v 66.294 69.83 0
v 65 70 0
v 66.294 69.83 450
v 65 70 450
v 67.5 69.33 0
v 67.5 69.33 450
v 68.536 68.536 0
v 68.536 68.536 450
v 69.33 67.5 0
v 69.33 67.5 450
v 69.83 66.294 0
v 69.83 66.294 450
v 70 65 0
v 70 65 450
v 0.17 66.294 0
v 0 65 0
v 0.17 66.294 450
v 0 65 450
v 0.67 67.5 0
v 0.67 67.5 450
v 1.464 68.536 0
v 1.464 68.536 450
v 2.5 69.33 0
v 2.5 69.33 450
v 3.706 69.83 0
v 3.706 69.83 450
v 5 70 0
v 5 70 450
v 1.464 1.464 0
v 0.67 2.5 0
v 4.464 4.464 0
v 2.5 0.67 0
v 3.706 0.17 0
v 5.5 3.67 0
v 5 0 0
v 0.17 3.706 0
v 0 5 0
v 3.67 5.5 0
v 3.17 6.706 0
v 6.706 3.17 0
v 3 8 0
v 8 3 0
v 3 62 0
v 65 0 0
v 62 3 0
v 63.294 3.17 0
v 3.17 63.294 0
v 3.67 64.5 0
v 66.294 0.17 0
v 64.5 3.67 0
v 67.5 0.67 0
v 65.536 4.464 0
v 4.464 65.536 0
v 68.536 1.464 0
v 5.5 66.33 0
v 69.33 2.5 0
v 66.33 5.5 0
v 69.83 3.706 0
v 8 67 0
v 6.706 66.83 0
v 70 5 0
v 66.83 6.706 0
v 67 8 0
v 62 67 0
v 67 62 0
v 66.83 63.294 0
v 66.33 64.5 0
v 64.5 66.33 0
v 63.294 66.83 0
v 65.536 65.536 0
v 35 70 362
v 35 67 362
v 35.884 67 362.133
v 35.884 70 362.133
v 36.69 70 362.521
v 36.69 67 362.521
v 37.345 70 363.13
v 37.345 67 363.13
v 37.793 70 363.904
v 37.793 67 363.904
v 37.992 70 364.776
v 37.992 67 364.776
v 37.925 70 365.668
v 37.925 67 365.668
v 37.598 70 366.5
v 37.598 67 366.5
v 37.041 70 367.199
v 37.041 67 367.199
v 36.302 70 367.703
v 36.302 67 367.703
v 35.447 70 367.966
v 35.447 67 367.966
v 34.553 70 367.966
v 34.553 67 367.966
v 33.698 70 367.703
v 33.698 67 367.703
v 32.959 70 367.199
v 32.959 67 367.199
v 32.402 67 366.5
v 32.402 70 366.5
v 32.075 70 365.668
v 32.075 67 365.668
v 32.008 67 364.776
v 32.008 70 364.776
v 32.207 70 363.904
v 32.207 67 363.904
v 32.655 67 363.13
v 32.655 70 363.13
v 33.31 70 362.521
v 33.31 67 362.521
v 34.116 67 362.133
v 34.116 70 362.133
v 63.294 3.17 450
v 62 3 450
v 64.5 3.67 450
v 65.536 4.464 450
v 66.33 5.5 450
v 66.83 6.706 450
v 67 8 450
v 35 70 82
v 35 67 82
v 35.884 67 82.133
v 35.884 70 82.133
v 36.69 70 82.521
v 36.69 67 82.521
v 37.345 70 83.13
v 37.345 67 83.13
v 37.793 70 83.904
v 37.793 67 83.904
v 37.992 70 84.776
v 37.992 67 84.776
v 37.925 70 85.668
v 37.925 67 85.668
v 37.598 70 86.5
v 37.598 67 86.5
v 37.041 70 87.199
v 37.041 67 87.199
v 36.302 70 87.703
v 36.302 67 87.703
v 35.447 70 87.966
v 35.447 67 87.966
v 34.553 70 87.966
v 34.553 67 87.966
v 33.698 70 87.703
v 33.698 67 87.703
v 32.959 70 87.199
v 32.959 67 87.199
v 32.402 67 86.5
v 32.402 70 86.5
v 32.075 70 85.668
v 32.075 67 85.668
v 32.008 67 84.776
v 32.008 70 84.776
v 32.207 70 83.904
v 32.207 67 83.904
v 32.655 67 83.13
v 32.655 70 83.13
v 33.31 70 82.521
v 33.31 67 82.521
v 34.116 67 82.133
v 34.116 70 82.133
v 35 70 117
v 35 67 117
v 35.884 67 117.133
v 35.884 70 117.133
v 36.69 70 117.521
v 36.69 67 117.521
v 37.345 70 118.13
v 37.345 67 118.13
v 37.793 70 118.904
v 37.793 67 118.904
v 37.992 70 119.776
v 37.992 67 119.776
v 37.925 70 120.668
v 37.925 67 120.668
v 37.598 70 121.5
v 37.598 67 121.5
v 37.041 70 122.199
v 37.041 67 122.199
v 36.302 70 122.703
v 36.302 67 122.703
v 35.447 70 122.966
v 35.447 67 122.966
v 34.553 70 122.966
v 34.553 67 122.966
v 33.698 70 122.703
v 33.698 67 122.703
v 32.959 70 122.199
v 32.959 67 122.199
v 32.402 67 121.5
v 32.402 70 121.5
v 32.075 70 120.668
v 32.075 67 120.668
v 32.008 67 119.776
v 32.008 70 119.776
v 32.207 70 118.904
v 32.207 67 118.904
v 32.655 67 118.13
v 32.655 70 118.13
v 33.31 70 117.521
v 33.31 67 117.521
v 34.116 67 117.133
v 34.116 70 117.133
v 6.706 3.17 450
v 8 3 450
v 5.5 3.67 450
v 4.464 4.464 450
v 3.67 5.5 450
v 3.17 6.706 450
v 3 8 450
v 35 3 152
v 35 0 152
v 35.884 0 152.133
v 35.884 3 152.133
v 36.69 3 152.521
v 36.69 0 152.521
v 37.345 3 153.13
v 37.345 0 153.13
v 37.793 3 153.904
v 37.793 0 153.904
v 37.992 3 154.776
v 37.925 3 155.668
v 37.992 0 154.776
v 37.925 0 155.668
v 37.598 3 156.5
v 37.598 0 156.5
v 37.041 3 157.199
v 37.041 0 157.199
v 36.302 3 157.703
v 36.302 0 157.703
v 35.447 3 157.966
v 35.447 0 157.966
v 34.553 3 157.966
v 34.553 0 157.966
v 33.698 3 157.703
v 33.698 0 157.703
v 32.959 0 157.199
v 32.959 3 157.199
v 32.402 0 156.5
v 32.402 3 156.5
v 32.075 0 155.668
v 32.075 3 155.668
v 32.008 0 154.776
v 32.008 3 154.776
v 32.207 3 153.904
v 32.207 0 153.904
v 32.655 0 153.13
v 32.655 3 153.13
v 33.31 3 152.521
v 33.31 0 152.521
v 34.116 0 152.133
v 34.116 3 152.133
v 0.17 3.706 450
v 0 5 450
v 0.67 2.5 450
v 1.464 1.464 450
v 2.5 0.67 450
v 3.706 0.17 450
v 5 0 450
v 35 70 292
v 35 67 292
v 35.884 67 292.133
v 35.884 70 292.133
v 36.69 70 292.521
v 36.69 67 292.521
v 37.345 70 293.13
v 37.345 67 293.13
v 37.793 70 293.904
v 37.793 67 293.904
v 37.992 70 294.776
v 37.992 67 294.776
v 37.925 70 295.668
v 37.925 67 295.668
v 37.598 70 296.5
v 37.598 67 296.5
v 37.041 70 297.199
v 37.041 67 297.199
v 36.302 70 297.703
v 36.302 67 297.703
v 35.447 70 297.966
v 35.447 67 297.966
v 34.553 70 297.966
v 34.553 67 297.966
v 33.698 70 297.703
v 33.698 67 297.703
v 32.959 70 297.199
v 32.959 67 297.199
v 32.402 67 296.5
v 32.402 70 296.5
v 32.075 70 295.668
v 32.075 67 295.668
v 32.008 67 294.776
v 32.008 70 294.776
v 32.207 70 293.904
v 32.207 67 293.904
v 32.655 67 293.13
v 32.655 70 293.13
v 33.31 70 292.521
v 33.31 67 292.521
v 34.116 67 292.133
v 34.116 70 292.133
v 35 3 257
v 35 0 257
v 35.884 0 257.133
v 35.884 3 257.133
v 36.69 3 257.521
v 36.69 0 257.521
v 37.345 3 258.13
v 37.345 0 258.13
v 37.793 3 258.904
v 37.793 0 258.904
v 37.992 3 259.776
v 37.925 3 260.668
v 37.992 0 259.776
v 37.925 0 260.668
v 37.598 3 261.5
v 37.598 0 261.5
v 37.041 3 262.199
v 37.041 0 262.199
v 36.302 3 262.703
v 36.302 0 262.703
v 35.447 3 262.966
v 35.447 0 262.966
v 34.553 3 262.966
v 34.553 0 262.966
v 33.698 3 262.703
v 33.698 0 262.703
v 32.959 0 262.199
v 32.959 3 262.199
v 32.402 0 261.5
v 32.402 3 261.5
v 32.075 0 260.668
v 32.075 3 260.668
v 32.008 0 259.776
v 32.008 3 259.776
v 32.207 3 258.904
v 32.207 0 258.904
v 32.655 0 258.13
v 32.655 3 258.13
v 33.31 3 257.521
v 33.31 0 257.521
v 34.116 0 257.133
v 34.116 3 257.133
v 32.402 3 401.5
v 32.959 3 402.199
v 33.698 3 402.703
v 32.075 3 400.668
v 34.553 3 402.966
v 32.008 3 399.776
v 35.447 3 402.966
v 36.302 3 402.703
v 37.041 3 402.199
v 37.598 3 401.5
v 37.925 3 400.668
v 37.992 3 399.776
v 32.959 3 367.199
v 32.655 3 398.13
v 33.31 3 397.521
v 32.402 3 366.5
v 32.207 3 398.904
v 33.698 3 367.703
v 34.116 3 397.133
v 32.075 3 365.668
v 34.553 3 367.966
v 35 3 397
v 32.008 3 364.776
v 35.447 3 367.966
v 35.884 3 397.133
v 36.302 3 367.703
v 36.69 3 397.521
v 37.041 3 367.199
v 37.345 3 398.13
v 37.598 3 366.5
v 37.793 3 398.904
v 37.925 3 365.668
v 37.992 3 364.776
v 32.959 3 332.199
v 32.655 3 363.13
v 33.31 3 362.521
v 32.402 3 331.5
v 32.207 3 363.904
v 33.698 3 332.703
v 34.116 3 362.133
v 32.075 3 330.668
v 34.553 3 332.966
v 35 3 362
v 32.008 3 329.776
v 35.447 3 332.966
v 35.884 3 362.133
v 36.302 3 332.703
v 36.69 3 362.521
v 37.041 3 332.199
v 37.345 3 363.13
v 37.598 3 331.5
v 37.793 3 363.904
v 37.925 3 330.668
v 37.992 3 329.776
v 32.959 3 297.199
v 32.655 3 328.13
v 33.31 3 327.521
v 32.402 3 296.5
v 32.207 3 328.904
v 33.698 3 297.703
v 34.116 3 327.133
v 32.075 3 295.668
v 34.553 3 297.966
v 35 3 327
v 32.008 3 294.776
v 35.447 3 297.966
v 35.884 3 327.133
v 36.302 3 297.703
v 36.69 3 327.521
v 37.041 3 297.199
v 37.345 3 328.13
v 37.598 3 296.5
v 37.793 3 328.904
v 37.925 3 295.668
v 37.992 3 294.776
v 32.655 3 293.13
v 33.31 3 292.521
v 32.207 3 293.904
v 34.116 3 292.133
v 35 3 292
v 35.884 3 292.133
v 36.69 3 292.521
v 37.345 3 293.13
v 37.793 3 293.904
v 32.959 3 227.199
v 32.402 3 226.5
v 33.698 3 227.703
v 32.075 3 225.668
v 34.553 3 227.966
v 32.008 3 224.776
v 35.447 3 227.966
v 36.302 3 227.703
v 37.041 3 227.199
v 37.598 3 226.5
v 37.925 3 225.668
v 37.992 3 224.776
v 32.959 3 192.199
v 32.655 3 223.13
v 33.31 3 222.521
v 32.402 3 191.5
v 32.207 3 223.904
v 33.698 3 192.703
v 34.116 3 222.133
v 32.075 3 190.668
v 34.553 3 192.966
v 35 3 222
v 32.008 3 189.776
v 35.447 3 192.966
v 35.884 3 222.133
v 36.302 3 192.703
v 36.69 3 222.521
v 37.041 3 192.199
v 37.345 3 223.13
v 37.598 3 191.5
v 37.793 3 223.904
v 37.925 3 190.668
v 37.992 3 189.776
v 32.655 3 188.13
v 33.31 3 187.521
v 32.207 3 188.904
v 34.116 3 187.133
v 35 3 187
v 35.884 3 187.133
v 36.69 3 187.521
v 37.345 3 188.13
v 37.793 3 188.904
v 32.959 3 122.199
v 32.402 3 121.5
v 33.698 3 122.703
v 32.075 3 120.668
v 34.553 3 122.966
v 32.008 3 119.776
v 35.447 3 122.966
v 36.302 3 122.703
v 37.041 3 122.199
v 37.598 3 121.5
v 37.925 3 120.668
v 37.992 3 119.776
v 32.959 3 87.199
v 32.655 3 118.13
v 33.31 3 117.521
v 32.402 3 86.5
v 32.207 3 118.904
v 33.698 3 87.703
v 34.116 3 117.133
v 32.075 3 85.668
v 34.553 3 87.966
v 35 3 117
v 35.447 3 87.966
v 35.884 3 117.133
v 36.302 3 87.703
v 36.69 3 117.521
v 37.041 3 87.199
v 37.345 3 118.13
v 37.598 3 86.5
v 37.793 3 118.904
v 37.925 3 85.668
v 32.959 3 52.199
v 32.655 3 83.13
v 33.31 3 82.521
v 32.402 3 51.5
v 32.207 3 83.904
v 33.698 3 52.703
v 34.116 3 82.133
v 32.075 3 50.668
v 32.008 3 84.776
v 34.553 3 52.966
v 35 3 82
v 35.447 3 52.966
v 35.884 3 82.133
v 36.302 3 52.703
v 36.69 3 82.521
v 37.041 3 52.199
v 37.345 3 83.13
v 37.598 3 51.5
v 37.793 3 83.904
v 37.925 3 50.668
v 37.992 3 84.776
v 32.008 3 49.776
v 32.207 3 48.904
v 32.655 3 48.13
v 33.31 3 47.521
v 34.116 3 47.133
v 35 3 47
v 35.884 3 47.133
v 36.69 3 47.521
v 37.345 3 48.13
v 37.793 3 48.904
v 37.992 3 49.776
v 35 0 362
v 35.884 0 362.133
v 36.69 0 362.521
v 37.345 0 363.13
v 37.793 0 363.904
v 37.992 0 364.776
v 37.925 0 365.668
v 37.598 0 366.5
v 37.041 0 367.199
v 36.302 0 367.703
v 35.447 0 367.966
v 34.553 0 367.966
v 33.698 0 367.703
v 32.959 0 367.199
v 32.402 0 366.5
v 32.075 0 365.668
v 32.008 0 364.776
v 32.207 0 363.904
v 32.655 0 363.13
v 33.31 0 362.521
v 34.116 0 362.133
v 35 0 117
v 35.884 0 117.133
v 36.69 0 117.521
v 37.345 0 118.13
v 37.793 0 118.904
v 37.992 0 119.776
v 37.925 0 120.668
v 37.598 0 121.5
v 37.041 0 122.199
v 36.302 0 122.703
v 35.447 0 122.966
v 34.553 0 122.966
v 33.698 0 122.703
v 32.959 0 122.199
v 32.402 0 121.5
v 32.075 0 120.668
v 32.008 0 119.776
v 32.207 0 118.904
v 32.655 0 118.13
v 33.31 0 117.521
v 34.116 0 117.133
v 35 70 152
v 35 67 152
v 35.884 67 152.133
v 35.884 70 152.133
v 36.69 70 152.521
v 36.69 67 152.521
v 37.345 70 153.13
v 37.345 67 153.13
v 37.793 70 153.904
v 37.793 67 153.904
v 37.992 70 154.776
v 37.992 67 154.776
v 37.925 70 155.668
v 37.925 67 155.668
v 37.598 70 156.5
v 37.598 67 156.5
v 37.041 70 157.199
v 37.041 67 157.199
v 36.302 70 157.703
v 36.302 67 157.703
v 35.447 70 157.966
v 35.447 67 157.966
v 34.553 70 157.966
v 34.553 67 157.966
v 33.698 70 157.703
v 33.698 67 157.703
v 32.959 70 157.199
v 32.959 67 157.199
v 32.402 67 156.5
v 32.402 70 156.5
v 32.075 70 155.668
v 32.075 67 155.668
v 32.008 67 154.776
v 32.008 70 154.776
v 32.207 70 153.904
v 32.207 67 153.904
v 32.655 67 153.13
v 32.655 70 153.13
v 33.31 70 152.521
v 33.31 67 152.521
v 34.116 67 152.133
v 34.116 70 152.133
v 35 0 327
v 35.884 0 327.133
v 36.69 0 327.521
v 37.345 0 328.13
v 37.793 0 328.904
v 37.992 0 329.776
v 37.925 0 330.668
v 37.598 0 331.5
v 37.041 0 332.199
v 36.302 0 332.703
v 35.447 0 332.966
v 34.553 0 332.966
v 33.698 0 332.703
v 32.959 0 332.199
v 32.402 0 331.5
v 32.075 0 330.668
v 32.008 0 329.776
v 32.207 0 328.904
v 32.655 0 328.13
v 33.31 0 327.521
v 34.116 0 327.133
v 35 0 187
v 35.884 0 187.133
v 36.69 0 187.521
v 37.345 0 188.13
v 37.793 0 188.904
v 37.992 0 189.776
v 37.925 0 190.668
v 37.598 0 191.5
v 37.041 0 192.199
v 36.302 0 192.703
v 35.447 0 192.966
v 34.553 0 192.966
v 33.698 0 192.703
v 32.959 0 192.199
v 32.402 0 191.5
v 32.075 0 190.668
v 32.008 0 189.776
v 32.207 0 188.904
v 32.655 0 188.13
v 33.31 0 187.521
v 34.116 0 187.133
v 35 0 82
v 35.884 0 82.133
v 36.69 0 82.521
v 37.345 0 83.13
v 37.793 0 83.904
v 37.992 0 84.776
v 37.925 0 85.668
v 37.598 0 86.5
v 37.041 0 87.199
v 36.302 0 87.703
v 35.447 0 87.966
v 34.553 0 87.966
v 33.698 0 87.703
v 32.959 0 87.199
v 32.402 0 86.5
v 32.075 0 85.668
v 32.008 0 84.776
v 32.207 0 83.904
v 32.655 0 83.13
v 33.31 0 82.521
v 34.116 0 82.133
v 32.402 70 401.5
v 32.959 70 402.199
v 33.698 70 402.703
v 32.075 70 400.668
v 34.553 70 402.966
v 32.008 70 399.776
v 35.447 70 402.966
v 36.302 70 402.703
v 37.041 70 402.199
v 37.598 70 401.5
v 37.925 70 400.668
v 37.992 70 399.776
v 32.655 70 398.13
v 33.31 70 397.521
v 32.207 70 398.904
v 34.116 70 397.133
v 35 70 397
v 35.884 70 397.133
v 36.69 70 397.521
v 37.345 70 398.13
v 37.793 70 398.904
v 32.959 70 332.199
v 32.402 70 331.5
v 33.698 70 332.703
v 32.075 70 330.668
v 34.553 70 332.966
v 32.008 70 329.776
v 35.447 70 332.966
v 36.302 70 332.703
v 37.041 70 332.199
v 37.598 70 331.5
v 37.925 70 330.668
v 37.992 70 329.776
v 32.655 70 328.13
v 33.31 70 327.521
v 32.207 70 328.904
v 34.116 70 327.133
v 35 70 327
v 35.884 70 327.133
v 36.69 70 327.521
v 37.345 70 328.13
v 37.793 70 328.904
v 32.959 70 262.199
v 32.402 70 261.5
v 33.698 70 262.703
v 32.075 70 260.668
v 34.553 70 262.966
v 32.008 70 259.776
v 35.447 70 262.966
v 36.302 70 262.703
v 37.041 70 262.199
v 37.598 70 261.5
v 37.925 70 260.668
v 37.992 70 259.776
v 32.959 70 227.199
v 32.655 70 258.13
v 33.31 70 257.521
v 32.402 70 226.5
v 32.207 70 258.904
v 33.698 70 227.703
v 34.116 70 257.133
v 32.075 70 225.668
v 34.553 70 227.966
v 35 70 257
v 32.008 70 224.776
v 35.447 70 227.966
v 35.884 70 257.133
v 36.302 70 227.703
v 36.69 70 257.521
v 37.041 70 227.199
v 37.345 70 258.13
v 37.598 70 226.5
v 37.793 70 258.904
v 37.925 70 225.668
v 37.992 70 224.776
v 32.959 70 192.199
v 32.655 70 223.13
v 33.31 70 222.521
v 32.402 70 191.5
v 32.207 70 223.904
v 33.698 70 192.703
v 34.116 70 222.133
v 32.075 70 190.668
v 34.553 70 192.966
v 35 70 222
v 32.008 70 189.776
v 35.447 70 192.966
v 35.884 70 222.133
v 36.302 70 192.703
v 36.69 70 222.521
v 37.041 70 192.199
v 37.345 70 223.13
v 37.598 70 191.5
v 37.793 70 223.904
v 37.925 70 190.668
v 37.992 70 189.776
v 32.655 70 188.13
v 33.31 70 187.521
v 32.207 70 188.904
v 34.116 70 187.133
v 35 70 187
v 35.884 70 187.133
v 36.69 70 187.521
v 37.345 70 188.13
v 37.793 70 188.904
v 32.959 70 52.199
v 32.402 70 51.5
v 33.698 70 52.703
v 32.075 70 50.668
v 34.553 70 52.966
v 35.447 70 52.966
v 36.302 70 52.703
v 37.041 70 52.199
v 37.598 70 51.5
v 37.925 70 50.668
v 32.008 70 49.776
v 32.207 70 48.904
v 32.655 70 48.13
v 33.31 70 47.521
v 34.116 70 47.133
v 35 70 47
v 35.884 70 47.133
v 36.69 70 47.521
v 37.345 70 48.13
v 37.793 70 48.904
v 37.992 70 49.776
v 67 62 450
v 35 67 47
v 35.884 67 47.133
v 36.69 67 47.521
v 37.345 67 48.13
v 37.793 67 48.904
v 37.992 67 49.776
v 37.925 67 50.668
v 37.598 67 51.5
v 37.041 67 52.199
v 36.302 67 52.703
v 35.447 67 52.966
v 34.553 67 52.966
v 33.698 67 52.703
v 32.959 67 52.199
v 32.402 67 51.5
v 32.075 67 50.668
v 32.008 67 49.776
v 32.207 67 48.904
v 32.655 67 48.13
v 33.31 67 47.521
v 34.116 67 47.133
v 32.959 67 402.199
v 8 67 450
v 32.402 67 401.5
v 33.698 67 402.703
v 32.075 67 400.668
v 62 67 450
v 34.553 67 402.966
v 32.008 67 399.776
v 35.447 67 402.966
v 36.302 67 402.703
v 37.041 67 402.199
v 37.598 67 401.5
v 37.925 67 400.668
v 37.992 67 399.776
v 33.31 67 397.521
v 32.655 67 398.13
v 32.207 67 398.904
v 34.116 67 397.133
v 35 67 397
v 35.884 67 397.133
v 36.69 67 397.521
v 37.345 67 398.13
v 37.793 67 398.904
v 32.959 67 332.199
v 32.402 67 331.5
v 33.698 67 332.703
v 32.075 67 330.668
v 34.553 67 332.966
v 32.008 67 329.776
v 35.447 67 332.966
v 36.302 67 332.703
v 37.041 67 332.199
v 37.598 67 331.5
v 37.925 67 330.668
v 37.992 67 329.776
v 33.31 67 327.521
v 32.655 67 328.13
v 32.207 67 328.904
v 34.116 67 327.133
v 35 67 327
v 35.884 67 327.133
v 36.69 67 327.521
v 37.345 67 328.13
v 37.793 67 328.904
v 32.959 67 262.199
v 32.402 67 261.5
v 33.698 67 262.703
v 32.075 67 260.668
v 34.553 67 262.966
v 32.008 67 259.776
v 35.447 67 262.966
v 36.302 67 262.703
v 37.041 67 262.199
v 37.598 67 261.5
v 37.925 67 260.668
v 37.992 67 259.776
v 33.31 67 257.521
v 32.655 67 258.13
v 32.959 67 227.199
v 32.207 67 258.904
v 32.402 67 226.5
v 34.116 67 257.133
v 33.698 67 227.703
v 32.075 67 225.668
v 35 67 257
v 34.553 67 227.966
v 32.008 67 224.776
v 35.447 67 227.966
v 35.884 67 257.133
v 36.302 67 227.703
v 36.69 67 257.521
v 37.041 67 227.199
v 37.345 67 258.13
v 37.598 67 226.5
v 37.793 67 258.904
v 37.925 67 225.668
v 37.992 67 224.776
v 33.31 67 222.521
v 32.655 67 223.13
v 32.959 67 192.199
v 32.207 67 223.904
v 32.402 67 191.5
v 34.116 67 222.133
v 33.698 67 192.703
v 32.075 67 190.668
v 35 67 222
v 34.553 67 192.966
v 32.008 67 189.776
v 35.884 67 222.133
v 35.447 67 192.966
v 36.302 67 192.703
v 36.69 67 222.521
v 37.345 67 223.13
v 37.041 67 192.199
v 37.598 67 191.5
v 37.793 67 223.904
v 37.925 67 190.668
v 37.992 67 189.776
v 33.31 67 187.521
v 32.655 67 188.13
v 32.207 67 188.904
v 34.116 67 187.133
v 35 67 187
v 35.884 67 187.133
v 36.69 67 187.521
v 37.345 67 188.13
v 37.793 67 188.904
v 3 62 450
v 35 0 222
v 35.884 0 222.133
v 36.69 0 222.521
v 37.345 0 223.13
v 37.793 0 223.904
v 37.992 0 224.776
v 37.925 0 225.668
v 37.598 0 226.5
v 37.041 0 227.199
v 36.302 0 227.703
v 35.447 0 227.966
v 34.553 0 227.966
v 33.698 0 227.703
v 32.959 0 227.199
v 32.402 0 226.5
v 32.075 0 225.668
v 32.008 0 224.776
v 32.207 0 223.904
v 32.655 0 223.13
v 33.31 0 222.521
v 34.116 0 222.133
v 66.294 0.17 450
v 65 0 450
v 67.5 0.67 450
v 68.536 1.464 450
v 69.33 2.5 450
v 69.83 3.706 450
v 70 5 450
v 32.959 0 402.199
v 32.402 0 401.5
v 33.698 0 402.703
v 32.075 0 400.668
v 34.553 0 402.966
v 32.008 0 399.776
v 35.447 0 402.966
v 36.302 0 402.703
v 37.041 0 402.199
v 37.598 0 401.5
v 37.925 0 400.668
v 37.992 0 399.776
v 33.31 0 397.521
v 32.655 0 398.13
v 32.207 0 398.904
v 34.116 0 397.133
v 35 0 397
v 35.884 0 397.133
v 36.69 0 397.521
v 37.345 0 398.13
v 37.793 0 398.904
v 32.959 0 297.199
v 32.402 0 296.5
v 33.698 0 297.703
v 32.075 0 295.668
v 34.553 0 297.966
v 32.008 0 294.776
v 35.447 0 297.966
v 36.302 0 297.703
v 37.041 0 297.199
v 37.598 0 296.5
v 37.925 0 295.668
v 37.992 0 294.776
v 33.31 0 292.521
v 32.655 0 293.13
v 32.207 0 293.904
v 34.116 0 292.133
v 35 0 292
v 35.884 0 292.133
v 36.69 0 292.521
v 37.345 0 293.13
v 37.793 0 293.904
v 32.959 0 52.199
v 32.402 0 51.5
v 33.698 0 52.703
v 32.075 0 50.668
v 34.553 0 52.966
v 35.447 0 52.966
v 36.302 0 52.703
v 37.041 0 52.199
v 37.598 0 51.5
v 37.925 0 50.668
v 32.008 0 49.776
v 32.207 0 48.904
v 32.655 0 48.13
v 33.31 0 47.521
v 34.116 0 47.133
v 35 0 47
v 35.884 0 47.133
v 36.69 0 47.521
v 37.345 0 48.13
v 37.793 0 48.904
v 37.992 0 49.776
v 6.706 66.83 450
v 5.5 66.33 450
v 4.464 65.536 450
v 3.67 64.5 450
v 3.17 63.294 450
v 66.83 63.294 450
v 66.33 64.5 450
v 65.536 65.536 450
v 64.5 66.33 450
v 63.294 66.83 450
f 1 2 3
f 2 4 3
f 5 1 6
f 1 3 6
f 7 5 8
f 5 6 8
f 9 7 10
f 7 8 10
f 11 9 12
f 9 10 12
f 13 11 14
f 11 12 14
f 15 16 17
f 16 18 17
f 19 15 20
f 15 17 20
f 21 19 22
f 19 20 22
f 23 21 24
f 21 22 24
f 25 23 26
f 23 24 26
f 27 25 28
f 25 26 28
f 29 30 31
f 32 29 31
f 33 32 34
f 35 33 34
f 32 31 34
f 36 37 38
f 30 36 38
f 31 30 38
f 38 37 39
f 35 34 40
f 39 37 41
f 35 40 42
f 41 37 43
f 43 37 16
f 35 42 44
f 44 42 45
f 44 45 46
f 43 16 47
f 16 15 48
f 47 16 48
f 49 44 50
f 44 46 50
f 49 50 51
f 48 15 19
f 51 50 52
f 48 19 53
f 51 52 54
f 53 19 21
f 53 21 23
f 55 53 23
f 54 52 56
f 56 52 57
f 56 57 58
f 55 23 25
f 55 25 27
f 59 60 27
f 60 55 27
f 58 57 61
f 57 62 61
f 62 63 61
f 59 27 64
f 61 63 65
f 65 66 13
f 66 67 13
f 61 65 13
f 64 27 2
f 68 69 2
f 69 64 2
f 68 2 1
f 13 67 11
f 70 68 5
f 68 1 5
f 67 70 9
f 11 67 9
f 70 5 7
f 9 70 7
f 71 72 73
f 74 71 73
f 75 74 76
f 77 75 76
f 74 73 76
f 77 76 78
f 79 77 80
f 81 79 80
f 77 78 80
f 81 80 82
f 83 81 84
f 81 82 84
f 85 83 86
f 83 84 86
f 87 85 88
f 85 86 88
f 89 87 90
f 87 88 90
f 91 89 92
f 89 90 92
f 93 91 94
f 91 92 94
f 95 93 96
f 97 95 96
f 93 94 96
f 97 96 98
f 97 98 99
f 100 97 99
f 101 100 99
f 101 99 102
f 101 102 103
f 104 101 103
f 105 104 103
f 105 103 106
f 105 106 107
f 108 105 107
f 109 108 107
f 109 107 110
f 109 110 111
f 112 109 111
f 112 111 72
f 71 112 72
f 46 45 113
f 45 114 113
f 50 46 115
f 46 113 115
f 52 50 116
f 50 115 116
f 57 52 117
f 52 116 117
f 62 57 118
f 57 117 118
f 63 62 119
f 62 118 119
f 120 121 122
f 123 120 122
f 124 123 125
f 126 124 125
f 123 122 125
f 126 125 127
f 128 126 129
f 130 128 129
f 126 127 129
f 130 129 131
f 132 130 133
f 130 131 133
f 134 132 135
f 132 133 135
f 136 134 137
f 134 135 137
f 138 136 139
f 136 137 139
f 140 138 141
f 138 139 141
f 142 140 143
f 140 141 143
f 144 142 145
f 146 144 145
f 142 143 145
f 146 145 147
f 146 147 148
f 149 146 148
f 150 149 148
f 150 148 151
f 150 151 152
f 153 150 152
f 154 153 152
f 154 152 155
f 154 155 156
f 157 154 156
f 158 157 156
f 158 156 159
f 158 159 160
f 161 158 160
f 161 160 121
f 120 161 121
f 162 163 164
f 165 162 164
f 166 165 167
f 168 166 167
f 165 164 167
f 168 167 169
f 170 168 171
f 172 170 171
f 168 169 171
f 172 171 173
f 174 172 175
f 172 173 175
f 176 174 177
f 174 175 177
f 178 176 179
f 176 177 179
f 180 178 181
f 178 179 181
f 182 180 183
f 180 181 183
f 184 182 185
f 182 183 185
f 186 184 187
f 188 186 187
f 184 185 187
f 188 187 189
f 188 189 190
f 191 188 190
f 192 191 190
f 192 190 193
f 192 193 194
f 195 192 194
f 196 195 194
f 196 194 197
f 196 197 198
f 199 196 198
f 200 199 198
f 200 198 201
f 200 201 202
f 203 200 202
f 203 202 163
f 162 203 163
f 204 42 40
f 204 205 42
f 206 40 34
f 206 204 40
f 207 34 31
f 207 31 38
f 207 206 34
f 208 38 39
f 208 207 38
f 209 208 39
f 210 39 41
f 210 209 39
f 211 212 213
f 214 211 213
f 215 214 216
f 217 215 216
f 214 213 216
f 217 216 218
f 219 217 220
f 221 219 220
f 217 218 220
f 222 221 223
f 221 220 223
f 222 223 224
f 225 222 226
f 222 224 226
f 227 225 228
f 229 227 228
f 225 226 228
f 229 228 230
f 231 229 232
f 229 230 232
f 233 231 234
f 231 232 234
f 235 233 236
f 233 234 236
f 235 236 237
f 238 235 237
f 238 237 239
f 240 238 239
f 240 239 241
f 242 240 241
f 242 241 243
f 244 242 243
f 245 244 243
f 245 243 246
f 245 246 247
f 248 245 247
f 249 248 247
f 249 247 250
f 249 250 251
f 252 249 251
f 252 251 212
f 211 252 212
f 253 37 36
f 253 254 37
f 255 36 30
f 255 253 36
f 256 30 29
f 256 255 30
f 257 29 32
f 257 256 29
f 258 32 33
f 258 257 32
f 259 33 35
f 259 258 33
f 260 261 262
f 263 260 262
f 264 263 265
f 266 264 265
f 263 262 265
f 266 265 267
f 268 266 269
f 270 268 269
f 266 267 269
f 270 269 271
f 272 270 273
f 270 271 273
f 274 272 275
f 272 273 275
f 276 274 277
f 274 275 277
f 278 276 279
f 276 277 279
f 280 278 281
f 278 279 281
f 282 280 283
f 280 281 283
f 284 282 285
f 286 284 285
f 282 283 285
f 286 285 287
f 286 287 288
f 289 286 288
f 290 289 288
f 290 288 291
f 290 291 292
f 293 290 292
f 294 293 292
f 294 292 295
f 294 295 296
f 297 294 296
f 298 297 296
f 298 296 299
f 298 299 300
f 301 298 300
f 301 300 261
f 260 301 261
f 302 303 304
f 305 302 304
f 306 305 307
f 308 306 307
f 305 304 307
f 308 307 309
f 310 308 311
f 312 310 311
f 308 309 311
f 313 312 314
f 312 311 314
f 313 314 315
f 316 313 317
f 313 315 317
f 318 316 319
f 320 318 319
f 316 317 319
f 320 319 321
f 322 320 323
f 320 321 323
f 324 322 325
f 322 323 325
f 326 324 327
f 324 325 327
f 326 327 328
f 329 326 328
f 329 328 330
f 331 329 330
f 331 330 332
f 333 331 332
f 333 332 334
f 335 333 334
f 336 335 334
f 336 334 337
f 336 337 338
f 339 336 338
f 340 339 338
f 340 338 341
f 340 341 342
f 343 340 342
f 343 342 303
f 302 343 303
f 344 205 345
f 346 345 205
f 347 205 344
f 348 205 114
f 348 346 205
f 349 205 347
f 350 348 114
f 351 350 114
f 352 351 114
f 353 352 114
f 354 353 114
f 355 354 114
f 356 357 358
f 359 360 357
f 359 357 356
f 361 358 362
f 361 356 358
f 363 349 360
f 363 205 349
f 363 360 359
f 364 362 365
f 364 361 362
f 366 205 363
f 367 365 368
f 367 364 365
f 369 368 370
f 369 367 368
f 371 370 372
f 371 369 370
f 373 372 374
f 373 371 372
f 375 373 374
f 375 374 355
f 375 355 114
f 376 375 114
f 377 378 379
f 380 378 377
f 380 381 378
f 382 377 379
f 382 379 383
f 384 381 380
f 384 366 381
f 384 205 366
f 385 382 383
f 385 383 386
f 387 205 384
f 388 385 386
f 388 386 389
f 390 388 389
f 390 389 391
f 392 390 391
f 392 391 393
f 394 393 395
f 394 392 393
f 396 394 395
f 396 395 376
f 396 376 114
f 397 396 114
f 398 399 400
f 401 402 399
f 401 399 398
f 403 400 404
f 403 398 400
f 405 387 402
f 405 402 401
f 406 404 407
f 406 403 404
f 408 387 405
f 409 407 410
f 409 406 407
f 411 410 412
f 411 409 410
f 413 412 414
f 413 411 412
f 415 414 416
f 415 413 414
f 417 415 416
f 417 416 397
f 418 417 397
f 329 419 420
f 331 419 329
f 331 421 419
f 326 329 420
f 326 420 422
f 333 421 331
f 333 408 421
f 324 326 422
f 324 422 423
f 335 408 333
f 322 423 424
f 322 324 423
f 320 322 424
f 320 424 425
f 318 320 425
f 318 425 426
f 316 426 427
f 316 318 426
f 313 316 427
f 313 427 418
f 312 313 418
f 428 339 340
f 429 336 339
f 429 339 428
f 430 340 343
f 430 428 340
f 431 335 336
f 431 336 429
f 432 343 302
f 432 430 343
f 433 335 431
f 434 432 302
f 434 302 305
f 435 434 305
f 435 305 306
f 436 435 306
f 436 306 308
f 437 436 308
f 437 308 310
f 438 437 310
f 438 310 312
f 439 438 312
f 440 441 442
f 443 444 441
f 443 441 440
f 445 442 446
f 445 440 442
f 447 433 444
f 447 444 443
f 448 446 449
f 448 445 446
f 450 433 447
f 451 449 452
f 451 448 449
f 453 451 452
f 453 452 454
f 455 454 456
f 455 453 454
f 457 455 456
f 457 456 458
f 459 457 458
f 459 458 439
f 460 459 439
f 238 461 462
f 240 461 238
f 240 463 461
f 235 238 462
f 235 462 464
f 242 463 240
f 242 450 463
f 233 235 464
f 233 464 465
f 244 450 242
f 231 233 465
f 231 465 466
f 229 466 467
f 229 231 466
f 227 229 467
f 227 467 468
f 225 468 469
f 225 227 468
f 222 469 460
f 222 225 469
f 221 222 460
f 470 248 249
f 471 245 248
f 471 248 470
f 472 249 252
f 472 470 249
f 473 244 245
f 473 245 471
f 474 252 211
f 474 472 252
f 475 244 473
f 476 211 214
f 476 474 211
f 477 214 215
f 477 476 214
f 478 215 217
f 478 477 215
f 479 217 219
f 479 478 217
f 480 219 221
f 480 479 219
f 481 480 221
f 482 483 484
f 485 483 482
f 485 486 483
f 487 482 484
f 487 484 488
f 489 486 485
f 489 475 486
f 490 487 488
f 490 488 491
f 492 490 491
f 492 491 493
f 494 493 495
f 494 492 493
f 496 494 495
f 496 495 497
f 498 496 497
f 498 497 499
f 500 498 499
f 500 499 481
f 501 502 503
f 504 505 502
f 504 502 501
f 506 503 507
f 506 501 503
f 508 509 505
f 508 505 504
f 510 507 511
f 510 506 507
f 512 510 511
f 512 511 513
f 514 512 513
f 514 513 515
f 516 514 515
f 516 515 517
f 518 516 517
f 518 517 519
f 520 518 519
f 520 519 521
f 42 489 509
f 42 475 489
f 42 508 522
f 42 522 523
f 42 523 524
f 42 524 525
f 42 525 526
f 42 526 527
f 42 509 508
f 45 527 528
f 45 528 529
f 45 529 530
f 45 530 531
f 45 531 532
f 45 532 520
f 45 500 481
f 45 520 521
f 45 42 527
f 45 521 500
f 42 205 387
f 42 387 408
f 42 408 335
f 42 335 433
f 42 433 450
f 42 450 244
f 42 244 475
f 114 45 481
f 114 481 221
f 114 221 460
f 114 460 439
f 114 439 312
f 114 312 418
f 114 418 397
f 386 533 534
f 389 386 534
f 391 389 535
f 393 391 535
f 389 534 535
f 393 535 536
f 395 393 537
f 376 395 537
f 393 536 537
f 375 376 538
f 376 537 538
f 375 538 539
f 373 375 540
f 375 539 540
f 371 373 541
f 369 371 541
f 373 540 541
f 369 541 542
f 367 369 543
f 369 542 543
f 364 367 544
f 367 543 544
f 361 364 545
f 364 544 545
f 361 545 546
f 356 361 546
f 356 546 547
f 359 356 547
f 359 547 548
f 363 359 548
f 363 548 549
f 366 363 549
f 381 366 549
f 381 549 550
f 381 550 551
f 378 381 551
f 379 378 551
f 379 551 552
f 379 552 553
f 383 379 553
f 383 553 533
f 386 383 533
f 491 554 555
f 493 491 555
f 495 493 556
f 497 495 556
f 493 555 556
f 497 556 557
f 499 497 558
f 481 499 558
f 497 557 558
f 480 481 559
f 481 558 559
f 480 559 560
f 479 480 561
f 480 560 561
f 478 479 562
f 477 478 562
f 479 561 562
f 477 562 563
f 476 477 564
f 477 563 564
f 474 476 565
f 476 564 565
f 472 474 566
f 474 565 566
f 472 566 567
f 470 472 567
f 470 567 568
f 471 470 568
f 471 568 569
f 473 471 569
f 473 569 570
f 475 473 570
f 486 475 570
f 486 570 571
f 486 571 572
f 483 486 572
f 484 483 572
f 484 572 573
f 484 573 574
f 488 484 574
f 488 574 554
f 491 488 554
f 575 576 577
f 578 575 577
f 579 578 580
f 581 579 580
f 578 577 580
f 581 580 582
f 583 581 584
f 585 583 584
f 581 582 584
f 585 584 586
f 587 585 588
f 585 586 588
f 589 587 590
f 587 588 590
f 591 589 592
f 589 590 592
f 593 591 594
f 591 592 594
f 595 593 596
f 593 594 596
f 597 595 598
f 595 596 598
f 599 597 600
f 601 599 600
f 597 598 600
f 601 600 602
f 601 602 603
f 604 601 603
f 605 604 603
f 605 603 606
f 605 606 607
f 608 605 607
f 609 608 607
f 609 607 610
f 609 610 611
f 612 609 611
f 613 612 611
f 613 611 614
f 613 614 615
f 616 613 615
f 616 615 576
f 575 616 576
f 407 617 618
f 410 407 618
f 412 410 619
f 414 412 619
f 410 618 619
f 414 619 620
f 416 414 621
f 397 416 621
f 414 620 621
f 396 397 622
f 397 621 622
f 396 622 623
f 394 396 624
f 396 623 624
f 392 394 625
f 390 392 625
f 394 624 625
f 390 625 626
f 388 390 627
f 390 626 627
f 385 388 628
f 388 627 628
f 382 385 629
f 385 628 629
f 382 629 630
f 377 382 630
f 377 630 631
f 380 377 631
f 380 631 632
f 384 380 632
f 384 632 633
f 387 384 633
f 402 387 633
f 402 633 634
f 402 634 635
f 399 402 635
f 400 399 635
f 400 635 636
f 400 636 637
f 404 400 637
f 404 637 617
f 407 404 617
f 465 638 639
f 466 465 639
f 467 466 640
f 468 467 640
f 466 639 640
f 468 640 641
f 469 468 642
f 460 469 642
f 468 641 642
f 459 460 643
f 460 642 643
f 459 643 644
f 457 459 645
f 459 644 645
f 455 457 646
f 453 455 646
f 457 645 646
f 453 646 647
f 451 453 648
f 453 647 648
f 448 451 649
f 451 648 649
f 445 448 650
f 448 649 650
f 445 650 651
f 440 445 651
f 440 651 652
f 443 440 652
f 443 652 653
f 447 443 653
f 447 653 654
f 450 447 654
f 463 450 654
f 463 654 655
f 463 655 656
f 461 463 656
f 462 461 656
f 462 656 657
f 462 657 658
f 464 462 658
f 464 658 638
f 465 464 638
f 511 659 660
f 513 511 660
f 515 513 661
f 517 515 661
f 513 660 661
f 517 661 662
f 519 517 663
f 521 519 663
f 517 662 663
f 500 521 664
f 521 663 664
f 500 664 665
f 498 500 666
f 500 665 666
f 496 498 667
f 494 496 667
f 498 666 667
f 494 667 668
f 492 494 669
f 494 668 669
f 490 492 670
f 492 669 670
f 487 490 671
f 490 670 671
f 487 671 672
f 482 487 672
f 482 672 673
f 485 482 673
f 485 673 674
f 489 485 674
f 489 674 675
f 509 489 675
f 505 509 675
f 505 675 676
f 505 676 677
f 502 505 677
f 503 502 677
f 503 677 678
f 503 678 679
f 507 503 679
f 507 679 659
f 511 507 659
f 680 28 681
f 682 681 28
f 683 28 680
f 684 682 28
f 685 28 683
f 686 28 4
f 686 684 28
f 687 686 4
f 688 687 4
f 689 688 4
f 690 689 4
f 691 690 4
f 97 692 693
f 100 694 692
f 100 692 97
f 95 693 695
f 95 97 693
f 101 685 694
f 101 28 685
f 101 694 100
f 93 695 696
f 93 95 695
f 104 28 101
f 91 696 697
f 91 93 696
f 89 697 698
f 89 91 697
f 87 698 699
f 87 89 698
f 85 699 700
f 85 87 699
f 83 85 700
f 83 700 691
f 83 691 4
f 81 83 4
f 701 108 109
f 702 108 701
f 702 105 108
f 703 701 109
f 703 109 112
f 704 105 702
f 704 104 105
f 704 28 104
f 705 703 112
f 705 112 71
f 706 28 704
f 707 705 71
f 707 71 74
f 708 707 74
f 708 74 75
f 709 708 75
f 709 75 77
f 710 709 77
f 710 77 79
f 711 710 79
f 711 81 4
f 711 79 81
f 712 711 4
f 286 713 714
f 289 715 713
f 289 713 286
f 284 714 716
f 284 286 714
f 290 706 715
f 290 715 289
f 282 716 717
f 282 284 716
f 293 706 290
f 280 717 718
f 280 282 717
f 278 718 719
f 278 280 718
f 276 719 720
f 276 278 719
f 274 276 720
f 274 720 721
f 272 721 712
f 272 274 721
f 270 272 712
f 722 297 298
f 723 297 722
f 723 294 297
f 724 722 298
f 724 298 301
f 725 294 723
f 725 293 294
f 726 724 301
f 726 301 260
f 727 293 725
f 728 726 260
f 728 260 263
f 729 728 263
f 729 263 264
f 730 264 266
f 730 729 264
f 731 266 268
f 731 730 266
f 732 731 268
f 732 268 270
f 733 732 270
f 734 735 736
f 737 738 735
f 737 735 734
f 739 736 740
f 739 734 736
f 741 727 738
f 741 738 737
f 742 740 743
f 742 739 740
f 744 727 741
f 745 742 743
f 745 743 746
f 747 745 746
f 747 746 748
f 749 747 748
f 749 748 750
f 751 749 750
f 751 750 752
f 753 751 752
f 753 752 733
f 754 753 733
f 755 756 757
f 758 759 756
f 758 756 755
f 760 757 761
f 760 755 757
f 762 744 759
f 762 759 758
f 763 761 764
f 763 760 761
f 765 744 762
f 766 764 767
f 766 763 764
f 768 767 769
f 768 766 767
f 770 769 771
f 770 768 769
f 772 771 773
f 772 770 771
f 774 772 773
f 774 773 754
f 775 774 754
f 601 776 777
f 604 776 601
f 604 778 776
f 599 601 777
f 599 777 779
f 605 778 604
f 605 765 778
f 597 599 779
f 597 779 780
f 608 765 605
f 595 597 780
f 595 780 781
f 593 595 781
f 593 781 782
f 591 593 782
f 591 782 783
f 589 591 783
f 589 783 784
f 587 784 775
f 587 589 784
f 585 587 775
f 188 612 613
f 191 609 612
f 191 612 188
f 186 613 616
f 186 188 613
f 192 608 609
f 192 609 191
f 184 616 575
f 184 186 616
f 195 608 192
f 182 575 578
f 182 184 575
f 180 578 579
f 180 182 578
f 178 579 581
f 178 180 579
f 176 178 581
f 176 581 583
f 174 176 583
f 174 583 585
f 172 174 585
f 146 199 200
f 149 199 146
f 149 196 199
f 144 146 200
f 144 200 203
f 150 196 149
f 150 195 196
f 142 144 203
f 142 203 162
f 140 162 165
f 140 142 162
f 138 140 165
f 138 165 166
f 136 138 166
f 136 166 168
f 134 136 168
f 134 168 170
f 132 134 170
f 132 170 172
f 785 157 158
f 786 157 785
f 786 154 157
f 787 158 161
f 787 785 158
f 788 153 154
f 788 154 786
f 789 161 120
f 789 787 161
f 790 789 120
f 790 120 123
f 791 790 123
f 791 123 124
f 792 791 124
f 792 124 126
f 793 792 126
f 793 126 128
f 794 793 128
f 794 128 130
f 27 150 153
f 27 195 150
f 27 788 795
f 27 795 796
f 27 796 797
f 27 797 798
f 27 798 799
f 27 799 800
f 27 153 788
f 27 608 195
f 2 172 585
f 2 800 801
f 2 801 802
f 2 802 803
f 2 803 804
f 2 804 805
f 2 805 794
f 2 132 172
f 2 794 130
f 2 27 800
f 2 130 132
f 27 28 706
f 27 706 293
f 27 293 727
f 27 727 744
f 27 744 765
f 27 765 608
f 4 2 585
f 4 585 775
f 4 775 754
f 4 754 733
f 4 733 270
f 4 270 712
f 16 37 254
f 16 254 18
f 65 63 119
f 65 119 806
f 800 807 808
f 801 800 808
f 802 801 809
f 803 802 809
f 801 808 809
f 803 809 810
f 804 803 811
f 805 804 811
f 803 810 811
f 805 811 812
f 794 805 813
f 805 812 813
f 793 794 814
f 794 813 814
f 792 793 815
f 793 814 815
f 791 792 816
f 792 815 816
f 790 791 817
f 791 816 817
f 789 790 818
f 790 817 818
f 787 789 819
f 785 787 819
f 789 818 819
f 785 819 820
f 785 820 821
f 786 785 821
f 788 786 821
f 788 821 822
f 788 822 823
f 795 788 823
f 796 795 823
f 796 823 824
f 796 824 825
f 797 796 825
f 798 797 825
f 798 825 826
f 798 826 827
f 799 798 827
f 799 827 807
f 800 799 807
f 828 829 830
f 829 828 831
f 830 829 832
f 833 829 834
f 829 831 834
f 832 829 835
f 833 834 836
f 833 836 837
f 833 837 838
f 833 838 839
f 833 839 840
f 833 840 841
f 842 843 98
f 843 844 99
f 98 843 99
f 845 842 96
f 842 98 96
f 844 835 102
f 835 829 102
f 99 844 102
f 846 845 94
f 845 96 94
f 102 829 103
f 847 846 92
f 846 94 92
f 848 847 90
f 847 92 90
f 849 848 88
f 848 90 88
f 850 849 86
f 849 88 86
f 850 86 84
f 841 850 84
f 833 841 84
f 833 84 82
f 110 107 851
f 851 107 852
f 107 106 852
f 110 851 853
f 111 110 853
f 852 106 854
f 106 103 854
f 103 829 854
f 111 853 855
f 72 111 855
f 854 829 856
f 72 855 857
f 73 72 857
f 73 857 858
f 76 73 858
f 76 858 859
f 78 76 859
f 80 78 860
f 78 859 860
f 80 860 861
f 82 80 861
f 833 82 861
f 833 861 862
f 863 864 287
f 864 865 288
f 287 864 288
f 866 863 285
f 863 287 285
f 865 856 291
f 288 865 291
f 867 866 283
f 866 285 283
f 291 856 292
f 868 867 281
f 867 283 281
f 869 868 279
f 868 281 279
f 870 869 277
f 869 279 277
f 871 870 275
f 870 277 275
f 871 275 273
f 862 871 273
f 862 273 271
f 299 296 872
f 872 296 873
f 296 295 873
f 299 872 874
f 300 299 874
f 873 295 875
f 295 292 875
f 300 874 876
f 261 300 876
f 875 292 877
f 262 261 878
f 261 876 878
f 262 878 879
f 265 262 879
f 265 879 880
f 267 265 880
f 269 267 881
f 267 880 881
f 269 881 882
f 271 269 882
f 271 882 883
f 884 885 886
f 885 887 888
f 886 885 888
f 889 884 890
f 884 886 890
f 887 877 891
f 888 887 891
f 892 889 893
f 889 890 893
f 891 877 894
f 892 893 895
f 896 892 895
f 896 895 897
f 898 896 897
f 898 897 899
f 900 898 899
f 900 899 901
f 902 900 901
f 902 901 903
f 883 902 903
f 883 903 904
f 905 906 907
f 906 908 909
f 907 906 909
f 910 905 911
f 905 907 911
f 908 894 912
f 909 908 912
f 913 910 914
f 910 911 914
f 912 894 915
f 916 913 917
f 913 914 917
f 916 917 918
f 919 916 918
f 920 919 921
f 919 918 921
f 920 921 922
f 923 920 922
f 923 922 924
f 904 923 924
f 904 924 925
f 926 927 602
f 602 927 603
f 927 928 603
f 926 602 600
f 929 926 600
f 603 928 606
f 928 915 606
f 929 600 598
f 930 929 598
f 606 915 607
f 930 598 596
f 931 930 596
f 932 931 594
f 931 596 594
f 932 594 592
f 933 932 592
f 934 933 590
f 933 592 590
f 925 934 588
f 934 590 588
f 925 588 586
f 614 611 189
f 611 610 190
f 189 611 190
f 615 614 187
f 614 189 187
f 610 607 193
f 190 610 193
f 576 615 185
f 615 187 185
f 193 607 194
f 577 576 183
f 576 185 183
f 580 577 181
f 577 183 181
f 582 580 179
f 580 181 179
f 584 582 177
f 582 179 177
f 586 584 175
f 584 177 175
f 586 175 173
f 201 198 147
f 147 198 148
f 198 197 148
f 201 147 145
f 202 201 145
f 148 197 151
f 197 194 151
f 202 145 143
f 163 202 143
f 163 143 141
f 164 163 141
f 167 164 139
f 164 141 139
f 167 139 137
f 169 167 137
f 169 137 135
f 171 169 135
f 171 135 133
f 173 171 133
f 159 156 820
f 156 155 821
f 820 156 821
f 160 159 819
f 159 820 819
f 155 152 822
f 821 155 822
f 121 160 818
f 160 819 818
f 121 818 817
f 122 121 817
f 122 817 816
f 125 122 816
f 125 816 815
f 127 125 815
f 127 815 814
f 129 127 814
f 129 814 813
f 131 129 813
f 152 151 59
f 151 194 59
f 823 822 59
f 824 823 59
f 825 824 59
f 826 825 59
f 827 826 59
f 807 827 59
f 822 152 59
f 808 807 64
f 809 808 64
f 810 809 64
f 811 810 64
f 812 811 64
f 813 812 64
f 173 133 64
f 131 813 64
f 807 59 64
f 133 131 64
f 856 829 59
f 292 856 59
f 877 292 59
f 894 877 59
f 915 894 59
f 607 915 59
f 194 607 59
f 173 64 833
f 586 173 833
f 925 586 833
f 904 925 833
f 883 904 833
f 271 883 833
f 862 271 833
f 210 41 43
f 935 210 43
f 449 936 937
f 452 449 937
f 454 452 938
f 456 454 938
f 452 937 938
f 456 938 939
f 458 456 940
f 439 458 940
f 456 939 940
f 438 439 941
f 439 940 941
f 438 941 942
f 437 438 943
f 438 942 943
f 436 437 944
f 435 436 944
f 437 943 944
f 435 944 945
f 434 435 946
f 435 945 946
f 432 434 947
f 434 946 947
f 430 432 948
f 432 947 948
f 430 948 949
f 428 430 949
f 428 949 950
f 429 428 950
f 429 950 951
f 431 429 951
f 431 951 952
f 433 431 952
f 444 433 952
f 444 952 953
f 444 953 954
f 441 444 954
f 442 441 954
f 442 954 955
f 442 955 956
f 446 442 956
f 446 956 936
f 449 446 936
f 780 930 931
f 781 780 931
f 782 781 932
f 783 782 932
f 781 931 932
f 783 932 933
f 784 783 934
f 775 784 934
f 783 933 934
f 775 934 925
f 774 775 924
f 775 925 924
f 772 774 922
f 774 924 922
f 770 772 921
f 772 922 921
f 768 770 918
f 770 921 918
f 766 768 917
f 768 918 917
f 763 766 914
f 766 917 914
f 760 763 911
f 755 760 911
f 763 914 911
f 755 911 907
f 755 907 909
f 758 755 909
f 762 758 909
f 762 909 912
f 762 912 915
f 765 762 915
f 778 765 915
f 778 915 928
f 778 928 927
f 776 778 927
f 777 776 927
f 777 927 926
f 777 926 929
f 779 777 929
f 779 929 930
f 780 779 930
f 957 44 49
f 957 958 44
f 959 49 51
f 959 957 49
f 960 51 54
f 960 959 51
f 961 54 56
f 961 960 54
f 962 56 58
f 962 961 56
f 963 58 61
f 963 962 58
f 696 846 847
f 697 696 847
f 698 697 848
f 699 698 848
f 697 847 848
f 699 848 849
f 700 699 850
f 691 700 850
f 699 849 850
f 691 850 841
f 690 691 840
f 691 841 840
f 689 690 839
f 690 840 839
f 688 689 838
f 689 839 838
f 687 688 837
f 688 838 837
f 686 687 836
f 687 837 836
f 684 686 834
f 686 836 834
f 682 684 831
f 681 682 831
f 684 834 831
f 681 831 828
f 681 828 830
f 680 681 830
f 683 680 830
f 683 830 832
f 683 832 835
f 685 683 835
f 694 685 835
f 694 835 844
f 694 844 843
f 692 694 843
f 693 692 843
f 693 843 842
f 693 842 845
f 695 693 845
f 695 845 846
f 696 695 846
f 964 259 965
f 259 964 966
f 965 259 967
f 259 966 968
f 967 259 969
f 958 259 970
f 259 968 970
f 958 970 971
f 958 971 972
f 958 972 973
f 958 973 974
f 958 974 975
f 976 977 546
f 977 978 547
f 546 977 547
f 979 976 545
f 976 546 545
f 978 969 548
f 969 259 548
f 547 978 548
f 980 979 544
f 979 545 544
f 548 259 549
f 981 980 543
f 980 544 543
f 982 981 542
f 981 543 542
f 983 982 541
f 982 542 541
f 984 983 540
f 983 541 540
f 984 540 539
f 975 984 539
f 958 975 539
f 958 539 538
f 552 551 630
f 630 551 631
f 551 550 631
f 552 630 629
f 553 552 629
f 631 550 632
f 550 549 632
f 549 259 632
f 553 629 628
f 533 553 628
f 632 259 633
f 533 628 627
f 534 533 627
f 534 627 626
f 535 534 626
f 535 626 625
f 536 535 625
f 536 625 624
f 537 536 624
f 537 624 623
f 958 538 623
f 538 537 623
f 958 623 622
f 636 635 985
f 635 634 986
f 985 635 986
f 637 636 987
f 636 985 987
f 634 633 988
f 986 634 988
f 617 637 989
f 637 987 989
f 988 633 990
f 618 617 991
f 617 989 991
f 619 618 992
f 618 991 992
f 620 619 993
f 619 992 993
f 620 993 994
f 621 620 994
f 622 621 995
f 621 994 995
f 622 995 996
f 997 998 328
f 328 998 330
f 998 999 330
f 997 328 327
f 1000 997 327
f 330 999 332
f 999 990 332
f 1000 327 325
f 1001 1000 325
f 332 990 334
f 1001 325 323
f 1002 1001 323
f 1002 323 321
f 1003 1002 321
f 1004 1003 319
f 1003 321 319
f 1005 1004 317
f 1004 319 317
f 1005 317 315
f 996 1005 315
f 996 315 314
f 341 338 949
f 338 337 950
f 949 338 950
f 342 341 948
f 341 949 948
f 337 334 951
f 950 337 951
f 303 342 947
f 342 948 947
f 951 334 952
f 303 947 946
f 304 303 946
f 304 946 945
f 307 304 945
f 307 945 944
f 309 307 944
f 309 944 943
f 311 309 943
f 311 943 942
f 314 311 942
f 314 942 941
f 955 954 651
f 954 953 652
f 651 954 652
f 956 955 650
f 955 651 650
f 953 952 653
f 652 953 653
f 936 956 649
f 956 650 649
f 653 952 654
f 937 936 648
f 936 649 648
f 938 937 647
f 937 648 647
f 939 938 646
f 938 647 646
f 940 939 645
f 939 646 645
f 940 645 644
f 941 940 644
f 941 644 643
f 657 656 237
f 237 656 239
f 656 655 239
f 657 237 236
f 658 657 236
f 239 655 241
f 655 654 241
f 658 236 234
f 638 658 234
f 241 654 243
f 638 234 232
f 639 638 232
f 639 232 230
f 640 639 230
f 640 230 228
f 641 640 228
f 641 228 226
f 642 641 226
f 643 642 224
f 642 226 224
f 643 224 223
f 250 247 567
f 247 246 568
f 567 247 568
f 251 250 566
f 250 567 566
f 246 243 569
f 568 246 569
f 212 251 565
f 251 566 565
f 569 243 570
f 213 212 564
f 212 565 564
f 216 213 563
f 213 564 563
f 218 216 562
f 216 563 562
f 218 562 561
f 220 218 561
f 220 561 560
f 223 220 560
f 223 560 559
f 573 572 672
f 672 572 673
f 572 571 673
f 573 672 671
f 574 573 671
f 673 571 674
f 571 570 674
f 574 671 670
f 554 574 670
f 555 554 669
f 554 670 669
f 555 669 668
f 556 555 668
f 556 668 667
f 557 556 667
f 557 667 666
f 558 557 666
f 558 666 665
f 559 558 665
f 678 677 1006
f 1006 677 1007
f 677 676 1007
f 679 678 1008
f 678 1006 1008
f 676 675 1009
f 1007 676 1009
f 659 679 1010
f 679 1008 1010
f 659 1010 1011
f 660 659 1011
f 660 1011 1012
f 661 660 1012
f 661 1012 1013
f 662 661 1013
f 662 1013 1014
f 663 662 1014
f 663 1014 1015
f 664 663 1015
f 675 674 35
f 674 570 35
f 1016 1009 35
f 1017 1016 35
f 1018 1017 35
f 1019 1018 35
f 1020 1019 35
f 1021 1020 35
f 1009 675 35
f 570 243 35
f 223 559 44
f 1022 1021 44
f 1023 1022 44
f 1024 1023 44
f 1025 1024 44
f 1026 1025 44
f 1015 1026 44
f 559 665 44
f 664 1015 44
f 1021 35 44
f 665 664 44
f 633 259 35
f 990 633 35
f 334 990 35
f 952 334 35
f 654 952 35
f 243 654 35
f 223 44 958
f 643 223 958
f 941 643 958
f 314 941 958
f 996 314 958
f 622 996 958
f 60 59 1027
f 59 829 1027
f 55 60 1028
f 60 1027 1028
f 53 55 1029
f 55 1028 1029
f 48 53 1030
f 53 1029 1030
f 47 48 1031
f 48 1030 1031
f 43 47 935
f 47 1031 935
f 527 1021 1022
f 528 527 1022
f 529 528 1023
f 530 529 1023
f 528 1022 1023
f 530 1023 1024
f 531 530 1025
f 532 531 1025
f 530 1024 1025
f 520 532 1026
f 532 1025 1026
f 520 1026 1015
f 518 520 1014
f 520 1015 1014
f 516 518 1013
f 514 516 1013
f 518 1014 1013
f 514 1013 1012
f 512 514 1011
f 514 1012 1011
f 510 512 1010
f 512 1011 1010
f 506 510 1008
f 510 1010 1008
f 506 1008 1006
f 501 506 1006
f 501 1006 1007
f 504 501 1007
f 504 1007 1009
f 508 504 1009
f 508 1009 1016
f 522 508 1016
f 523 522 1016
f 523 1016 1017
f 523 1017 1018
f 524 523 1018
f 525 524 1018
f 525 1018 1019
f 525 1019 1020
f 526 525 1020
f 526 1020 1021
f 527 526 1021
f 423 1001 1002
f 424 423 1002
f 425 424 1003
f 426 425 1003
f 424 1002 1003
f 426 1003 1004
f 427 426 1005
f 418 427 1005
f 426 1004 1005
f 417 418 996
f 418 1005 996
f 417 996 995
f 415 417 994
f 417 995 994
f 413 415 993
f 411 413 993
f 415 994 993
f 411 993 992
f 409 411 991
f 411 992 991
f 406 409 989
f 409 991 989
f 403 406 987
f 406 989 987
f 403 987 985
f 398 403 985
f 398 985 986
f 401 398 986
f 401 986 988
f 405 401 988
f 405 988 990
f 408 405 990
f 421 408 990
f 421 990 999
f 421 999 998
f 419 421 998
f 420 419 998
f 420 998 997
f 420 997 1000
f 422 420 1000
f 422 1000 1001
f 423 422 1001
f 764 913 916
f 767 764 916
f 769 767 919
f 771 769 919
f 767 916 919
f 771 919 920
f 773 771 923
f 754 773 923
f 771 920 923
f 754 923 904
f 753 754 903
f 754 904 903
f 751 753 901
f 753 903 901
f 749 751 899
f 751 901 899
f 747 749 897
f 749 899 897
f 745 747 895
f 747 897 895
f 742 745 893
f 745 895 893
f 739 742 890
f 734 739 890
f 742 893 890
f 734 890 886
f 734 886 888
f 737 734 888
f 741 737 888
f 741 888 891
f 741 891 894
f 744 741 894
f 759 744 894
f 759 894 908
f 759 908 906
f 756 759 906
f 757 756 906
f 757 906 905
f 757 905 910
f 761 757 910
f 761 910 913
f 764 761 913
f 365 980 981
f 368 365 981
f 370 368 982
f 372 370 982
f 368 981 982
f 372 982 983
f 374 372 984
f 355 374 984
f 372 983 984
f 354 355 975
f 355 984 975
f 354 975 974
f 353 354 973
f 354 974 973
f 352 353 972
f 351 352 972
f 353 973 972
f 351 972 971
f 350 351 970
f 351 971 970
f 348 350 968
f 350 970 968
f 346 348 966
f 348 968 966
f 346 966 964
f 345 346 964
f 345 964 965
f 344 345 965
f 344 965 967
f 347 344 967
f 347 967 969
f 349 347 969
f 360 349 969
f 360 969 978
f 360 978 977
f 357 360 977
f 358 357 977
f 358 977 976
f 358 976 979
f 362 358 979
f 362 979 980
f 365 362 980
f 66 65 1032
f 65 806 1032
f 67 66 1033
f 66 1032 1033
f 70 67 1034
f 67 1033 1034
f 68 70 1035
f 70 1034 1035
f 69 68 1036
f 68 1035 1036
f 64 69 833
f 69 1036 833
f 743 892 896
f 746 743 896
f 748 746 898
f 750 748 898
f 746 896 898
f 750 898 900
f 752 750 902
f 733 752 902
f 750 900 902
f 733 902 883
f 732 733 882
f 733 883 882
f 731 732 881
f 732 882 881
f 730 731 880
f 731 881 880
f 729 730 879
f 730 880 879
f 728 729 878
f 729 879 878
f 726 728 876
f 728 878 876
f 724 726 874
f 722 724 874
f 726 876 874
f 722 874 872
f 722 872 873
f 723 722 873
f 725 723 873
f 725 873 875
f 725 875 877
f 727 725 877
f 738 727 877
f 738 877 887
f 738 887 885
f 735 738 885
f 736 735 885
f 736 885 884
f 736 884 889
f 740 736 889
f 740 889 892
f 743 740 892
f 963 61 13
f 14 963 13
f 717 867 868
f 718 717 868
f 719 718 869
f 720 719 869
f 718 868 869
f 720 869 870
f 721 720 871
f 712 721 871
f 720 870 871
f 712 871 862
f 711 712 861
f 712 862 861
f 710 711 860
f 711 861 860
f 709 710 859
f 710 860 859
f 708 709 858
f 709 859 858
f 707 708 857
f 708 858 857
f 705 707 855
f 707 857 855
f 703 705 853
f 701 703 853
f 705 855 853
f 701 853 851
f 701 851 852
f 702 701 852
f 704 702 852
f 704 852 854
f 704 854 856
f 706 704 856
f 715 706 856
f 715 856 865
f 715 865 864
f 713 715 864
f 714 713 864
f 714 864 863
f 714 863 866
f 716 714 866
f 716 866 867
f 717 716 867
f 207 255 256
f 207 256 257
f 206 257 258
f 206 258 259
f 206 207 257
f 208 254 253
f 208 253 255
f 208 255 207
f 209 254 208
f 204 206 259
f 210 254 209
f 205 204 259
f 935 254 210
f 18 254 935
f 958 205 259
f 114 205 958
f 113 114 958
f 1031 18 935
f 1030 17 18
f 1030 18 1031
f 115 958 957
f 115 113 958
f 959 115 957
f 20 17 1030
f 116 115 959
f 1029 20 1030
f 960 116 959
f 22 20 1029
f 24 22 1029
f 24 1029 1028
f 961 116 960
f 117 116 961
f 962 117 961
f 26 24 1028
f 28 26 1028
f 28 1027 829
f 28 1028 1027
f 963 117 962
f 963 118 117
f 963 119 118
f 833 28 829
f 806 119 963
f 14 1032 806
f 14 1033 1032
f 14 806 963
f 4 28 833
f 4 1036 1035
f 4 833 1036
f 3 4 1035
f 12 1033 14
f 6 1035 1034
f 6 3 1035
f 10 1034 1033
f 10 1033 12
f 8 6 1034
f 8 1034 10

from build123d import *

# Parameters (mm, degrees)
SKETCH1_W           = 70
SKETCH1_H           = 70
SKETCH1_W_2         = 64
SKETCH1_H_2         = 64
BOSS_EXTRUDE1_DEPTH = 450
FILLET1_R           = 5
SKETCH3_R           = 3
CUT_EXTRUDE2_DEPTH  = 173
LPATTERN1_COUNT     = 6
LPATTERN1_PITCH     = 35
LPATTERN1_COL_COUNT = 6
LPATTERN1_COL_PITCH = 35


with BuildPart() as part:
    # Sketch1 → Boss-Extrude1 (new body)
    with BuildSketch(Plane.XY):
        with Locations((35, 35)):
            Rectangle(SKETCH1_W, SKETCH1_H)
        with Locations((35, 35)):
            Rectangle(SKETCH1_W_2, SKETCH1_H_2, mode=Mode.SUBTRACT)
    extrude(amount=BOSS_EXTRUDE1_DEPTH)

    # Fillet1
    fillet1_edges = [part.edges().sort_by_distance(p)[0] for p in [
        (3, 67, 225),
        (3, 3, 225),
        (67, 3, 225),
        (67, 67, 225),
        (0, 70, 225),
        (70, 70, 225),
        (70, 0, 225),
        (0, 0, 225),
    ]]
    fillet(fillet1_edges, radius=FILLET1_R)

    # Sketch3 → Cut-Extrude2 (cut)
    with BuildSketch(Plane.XZ):
        with Locations(Location((35, 225, 0), (0, 0, 270))):
            Circle(SKETCH3_R)
    cut_extrude2 = extrude(amount=-CUT_EXTRUDE2_DEPTH, mode=Mode.SUBTRACT)

    # LPattern1: Cut-Extrude2 ×6
    with Locations(*[(0, 0, -i * LPATTERN1_PITCH) for i in range(1, LPATTERN1_COUNT)]):
        add(cut_extrude2, mode=Mode.SUBTRACT)

    # LPattern1 col: Cut-Extrude2 ×6
    with Locations(*[(0, 0, i * LPATTERN1_COL_PITCH) for i in range(1, LPATTERN1_COL_COUNT)]):
        add(cut_extrude2, mode=Mode.SUBTRACT)


solid = part.part
